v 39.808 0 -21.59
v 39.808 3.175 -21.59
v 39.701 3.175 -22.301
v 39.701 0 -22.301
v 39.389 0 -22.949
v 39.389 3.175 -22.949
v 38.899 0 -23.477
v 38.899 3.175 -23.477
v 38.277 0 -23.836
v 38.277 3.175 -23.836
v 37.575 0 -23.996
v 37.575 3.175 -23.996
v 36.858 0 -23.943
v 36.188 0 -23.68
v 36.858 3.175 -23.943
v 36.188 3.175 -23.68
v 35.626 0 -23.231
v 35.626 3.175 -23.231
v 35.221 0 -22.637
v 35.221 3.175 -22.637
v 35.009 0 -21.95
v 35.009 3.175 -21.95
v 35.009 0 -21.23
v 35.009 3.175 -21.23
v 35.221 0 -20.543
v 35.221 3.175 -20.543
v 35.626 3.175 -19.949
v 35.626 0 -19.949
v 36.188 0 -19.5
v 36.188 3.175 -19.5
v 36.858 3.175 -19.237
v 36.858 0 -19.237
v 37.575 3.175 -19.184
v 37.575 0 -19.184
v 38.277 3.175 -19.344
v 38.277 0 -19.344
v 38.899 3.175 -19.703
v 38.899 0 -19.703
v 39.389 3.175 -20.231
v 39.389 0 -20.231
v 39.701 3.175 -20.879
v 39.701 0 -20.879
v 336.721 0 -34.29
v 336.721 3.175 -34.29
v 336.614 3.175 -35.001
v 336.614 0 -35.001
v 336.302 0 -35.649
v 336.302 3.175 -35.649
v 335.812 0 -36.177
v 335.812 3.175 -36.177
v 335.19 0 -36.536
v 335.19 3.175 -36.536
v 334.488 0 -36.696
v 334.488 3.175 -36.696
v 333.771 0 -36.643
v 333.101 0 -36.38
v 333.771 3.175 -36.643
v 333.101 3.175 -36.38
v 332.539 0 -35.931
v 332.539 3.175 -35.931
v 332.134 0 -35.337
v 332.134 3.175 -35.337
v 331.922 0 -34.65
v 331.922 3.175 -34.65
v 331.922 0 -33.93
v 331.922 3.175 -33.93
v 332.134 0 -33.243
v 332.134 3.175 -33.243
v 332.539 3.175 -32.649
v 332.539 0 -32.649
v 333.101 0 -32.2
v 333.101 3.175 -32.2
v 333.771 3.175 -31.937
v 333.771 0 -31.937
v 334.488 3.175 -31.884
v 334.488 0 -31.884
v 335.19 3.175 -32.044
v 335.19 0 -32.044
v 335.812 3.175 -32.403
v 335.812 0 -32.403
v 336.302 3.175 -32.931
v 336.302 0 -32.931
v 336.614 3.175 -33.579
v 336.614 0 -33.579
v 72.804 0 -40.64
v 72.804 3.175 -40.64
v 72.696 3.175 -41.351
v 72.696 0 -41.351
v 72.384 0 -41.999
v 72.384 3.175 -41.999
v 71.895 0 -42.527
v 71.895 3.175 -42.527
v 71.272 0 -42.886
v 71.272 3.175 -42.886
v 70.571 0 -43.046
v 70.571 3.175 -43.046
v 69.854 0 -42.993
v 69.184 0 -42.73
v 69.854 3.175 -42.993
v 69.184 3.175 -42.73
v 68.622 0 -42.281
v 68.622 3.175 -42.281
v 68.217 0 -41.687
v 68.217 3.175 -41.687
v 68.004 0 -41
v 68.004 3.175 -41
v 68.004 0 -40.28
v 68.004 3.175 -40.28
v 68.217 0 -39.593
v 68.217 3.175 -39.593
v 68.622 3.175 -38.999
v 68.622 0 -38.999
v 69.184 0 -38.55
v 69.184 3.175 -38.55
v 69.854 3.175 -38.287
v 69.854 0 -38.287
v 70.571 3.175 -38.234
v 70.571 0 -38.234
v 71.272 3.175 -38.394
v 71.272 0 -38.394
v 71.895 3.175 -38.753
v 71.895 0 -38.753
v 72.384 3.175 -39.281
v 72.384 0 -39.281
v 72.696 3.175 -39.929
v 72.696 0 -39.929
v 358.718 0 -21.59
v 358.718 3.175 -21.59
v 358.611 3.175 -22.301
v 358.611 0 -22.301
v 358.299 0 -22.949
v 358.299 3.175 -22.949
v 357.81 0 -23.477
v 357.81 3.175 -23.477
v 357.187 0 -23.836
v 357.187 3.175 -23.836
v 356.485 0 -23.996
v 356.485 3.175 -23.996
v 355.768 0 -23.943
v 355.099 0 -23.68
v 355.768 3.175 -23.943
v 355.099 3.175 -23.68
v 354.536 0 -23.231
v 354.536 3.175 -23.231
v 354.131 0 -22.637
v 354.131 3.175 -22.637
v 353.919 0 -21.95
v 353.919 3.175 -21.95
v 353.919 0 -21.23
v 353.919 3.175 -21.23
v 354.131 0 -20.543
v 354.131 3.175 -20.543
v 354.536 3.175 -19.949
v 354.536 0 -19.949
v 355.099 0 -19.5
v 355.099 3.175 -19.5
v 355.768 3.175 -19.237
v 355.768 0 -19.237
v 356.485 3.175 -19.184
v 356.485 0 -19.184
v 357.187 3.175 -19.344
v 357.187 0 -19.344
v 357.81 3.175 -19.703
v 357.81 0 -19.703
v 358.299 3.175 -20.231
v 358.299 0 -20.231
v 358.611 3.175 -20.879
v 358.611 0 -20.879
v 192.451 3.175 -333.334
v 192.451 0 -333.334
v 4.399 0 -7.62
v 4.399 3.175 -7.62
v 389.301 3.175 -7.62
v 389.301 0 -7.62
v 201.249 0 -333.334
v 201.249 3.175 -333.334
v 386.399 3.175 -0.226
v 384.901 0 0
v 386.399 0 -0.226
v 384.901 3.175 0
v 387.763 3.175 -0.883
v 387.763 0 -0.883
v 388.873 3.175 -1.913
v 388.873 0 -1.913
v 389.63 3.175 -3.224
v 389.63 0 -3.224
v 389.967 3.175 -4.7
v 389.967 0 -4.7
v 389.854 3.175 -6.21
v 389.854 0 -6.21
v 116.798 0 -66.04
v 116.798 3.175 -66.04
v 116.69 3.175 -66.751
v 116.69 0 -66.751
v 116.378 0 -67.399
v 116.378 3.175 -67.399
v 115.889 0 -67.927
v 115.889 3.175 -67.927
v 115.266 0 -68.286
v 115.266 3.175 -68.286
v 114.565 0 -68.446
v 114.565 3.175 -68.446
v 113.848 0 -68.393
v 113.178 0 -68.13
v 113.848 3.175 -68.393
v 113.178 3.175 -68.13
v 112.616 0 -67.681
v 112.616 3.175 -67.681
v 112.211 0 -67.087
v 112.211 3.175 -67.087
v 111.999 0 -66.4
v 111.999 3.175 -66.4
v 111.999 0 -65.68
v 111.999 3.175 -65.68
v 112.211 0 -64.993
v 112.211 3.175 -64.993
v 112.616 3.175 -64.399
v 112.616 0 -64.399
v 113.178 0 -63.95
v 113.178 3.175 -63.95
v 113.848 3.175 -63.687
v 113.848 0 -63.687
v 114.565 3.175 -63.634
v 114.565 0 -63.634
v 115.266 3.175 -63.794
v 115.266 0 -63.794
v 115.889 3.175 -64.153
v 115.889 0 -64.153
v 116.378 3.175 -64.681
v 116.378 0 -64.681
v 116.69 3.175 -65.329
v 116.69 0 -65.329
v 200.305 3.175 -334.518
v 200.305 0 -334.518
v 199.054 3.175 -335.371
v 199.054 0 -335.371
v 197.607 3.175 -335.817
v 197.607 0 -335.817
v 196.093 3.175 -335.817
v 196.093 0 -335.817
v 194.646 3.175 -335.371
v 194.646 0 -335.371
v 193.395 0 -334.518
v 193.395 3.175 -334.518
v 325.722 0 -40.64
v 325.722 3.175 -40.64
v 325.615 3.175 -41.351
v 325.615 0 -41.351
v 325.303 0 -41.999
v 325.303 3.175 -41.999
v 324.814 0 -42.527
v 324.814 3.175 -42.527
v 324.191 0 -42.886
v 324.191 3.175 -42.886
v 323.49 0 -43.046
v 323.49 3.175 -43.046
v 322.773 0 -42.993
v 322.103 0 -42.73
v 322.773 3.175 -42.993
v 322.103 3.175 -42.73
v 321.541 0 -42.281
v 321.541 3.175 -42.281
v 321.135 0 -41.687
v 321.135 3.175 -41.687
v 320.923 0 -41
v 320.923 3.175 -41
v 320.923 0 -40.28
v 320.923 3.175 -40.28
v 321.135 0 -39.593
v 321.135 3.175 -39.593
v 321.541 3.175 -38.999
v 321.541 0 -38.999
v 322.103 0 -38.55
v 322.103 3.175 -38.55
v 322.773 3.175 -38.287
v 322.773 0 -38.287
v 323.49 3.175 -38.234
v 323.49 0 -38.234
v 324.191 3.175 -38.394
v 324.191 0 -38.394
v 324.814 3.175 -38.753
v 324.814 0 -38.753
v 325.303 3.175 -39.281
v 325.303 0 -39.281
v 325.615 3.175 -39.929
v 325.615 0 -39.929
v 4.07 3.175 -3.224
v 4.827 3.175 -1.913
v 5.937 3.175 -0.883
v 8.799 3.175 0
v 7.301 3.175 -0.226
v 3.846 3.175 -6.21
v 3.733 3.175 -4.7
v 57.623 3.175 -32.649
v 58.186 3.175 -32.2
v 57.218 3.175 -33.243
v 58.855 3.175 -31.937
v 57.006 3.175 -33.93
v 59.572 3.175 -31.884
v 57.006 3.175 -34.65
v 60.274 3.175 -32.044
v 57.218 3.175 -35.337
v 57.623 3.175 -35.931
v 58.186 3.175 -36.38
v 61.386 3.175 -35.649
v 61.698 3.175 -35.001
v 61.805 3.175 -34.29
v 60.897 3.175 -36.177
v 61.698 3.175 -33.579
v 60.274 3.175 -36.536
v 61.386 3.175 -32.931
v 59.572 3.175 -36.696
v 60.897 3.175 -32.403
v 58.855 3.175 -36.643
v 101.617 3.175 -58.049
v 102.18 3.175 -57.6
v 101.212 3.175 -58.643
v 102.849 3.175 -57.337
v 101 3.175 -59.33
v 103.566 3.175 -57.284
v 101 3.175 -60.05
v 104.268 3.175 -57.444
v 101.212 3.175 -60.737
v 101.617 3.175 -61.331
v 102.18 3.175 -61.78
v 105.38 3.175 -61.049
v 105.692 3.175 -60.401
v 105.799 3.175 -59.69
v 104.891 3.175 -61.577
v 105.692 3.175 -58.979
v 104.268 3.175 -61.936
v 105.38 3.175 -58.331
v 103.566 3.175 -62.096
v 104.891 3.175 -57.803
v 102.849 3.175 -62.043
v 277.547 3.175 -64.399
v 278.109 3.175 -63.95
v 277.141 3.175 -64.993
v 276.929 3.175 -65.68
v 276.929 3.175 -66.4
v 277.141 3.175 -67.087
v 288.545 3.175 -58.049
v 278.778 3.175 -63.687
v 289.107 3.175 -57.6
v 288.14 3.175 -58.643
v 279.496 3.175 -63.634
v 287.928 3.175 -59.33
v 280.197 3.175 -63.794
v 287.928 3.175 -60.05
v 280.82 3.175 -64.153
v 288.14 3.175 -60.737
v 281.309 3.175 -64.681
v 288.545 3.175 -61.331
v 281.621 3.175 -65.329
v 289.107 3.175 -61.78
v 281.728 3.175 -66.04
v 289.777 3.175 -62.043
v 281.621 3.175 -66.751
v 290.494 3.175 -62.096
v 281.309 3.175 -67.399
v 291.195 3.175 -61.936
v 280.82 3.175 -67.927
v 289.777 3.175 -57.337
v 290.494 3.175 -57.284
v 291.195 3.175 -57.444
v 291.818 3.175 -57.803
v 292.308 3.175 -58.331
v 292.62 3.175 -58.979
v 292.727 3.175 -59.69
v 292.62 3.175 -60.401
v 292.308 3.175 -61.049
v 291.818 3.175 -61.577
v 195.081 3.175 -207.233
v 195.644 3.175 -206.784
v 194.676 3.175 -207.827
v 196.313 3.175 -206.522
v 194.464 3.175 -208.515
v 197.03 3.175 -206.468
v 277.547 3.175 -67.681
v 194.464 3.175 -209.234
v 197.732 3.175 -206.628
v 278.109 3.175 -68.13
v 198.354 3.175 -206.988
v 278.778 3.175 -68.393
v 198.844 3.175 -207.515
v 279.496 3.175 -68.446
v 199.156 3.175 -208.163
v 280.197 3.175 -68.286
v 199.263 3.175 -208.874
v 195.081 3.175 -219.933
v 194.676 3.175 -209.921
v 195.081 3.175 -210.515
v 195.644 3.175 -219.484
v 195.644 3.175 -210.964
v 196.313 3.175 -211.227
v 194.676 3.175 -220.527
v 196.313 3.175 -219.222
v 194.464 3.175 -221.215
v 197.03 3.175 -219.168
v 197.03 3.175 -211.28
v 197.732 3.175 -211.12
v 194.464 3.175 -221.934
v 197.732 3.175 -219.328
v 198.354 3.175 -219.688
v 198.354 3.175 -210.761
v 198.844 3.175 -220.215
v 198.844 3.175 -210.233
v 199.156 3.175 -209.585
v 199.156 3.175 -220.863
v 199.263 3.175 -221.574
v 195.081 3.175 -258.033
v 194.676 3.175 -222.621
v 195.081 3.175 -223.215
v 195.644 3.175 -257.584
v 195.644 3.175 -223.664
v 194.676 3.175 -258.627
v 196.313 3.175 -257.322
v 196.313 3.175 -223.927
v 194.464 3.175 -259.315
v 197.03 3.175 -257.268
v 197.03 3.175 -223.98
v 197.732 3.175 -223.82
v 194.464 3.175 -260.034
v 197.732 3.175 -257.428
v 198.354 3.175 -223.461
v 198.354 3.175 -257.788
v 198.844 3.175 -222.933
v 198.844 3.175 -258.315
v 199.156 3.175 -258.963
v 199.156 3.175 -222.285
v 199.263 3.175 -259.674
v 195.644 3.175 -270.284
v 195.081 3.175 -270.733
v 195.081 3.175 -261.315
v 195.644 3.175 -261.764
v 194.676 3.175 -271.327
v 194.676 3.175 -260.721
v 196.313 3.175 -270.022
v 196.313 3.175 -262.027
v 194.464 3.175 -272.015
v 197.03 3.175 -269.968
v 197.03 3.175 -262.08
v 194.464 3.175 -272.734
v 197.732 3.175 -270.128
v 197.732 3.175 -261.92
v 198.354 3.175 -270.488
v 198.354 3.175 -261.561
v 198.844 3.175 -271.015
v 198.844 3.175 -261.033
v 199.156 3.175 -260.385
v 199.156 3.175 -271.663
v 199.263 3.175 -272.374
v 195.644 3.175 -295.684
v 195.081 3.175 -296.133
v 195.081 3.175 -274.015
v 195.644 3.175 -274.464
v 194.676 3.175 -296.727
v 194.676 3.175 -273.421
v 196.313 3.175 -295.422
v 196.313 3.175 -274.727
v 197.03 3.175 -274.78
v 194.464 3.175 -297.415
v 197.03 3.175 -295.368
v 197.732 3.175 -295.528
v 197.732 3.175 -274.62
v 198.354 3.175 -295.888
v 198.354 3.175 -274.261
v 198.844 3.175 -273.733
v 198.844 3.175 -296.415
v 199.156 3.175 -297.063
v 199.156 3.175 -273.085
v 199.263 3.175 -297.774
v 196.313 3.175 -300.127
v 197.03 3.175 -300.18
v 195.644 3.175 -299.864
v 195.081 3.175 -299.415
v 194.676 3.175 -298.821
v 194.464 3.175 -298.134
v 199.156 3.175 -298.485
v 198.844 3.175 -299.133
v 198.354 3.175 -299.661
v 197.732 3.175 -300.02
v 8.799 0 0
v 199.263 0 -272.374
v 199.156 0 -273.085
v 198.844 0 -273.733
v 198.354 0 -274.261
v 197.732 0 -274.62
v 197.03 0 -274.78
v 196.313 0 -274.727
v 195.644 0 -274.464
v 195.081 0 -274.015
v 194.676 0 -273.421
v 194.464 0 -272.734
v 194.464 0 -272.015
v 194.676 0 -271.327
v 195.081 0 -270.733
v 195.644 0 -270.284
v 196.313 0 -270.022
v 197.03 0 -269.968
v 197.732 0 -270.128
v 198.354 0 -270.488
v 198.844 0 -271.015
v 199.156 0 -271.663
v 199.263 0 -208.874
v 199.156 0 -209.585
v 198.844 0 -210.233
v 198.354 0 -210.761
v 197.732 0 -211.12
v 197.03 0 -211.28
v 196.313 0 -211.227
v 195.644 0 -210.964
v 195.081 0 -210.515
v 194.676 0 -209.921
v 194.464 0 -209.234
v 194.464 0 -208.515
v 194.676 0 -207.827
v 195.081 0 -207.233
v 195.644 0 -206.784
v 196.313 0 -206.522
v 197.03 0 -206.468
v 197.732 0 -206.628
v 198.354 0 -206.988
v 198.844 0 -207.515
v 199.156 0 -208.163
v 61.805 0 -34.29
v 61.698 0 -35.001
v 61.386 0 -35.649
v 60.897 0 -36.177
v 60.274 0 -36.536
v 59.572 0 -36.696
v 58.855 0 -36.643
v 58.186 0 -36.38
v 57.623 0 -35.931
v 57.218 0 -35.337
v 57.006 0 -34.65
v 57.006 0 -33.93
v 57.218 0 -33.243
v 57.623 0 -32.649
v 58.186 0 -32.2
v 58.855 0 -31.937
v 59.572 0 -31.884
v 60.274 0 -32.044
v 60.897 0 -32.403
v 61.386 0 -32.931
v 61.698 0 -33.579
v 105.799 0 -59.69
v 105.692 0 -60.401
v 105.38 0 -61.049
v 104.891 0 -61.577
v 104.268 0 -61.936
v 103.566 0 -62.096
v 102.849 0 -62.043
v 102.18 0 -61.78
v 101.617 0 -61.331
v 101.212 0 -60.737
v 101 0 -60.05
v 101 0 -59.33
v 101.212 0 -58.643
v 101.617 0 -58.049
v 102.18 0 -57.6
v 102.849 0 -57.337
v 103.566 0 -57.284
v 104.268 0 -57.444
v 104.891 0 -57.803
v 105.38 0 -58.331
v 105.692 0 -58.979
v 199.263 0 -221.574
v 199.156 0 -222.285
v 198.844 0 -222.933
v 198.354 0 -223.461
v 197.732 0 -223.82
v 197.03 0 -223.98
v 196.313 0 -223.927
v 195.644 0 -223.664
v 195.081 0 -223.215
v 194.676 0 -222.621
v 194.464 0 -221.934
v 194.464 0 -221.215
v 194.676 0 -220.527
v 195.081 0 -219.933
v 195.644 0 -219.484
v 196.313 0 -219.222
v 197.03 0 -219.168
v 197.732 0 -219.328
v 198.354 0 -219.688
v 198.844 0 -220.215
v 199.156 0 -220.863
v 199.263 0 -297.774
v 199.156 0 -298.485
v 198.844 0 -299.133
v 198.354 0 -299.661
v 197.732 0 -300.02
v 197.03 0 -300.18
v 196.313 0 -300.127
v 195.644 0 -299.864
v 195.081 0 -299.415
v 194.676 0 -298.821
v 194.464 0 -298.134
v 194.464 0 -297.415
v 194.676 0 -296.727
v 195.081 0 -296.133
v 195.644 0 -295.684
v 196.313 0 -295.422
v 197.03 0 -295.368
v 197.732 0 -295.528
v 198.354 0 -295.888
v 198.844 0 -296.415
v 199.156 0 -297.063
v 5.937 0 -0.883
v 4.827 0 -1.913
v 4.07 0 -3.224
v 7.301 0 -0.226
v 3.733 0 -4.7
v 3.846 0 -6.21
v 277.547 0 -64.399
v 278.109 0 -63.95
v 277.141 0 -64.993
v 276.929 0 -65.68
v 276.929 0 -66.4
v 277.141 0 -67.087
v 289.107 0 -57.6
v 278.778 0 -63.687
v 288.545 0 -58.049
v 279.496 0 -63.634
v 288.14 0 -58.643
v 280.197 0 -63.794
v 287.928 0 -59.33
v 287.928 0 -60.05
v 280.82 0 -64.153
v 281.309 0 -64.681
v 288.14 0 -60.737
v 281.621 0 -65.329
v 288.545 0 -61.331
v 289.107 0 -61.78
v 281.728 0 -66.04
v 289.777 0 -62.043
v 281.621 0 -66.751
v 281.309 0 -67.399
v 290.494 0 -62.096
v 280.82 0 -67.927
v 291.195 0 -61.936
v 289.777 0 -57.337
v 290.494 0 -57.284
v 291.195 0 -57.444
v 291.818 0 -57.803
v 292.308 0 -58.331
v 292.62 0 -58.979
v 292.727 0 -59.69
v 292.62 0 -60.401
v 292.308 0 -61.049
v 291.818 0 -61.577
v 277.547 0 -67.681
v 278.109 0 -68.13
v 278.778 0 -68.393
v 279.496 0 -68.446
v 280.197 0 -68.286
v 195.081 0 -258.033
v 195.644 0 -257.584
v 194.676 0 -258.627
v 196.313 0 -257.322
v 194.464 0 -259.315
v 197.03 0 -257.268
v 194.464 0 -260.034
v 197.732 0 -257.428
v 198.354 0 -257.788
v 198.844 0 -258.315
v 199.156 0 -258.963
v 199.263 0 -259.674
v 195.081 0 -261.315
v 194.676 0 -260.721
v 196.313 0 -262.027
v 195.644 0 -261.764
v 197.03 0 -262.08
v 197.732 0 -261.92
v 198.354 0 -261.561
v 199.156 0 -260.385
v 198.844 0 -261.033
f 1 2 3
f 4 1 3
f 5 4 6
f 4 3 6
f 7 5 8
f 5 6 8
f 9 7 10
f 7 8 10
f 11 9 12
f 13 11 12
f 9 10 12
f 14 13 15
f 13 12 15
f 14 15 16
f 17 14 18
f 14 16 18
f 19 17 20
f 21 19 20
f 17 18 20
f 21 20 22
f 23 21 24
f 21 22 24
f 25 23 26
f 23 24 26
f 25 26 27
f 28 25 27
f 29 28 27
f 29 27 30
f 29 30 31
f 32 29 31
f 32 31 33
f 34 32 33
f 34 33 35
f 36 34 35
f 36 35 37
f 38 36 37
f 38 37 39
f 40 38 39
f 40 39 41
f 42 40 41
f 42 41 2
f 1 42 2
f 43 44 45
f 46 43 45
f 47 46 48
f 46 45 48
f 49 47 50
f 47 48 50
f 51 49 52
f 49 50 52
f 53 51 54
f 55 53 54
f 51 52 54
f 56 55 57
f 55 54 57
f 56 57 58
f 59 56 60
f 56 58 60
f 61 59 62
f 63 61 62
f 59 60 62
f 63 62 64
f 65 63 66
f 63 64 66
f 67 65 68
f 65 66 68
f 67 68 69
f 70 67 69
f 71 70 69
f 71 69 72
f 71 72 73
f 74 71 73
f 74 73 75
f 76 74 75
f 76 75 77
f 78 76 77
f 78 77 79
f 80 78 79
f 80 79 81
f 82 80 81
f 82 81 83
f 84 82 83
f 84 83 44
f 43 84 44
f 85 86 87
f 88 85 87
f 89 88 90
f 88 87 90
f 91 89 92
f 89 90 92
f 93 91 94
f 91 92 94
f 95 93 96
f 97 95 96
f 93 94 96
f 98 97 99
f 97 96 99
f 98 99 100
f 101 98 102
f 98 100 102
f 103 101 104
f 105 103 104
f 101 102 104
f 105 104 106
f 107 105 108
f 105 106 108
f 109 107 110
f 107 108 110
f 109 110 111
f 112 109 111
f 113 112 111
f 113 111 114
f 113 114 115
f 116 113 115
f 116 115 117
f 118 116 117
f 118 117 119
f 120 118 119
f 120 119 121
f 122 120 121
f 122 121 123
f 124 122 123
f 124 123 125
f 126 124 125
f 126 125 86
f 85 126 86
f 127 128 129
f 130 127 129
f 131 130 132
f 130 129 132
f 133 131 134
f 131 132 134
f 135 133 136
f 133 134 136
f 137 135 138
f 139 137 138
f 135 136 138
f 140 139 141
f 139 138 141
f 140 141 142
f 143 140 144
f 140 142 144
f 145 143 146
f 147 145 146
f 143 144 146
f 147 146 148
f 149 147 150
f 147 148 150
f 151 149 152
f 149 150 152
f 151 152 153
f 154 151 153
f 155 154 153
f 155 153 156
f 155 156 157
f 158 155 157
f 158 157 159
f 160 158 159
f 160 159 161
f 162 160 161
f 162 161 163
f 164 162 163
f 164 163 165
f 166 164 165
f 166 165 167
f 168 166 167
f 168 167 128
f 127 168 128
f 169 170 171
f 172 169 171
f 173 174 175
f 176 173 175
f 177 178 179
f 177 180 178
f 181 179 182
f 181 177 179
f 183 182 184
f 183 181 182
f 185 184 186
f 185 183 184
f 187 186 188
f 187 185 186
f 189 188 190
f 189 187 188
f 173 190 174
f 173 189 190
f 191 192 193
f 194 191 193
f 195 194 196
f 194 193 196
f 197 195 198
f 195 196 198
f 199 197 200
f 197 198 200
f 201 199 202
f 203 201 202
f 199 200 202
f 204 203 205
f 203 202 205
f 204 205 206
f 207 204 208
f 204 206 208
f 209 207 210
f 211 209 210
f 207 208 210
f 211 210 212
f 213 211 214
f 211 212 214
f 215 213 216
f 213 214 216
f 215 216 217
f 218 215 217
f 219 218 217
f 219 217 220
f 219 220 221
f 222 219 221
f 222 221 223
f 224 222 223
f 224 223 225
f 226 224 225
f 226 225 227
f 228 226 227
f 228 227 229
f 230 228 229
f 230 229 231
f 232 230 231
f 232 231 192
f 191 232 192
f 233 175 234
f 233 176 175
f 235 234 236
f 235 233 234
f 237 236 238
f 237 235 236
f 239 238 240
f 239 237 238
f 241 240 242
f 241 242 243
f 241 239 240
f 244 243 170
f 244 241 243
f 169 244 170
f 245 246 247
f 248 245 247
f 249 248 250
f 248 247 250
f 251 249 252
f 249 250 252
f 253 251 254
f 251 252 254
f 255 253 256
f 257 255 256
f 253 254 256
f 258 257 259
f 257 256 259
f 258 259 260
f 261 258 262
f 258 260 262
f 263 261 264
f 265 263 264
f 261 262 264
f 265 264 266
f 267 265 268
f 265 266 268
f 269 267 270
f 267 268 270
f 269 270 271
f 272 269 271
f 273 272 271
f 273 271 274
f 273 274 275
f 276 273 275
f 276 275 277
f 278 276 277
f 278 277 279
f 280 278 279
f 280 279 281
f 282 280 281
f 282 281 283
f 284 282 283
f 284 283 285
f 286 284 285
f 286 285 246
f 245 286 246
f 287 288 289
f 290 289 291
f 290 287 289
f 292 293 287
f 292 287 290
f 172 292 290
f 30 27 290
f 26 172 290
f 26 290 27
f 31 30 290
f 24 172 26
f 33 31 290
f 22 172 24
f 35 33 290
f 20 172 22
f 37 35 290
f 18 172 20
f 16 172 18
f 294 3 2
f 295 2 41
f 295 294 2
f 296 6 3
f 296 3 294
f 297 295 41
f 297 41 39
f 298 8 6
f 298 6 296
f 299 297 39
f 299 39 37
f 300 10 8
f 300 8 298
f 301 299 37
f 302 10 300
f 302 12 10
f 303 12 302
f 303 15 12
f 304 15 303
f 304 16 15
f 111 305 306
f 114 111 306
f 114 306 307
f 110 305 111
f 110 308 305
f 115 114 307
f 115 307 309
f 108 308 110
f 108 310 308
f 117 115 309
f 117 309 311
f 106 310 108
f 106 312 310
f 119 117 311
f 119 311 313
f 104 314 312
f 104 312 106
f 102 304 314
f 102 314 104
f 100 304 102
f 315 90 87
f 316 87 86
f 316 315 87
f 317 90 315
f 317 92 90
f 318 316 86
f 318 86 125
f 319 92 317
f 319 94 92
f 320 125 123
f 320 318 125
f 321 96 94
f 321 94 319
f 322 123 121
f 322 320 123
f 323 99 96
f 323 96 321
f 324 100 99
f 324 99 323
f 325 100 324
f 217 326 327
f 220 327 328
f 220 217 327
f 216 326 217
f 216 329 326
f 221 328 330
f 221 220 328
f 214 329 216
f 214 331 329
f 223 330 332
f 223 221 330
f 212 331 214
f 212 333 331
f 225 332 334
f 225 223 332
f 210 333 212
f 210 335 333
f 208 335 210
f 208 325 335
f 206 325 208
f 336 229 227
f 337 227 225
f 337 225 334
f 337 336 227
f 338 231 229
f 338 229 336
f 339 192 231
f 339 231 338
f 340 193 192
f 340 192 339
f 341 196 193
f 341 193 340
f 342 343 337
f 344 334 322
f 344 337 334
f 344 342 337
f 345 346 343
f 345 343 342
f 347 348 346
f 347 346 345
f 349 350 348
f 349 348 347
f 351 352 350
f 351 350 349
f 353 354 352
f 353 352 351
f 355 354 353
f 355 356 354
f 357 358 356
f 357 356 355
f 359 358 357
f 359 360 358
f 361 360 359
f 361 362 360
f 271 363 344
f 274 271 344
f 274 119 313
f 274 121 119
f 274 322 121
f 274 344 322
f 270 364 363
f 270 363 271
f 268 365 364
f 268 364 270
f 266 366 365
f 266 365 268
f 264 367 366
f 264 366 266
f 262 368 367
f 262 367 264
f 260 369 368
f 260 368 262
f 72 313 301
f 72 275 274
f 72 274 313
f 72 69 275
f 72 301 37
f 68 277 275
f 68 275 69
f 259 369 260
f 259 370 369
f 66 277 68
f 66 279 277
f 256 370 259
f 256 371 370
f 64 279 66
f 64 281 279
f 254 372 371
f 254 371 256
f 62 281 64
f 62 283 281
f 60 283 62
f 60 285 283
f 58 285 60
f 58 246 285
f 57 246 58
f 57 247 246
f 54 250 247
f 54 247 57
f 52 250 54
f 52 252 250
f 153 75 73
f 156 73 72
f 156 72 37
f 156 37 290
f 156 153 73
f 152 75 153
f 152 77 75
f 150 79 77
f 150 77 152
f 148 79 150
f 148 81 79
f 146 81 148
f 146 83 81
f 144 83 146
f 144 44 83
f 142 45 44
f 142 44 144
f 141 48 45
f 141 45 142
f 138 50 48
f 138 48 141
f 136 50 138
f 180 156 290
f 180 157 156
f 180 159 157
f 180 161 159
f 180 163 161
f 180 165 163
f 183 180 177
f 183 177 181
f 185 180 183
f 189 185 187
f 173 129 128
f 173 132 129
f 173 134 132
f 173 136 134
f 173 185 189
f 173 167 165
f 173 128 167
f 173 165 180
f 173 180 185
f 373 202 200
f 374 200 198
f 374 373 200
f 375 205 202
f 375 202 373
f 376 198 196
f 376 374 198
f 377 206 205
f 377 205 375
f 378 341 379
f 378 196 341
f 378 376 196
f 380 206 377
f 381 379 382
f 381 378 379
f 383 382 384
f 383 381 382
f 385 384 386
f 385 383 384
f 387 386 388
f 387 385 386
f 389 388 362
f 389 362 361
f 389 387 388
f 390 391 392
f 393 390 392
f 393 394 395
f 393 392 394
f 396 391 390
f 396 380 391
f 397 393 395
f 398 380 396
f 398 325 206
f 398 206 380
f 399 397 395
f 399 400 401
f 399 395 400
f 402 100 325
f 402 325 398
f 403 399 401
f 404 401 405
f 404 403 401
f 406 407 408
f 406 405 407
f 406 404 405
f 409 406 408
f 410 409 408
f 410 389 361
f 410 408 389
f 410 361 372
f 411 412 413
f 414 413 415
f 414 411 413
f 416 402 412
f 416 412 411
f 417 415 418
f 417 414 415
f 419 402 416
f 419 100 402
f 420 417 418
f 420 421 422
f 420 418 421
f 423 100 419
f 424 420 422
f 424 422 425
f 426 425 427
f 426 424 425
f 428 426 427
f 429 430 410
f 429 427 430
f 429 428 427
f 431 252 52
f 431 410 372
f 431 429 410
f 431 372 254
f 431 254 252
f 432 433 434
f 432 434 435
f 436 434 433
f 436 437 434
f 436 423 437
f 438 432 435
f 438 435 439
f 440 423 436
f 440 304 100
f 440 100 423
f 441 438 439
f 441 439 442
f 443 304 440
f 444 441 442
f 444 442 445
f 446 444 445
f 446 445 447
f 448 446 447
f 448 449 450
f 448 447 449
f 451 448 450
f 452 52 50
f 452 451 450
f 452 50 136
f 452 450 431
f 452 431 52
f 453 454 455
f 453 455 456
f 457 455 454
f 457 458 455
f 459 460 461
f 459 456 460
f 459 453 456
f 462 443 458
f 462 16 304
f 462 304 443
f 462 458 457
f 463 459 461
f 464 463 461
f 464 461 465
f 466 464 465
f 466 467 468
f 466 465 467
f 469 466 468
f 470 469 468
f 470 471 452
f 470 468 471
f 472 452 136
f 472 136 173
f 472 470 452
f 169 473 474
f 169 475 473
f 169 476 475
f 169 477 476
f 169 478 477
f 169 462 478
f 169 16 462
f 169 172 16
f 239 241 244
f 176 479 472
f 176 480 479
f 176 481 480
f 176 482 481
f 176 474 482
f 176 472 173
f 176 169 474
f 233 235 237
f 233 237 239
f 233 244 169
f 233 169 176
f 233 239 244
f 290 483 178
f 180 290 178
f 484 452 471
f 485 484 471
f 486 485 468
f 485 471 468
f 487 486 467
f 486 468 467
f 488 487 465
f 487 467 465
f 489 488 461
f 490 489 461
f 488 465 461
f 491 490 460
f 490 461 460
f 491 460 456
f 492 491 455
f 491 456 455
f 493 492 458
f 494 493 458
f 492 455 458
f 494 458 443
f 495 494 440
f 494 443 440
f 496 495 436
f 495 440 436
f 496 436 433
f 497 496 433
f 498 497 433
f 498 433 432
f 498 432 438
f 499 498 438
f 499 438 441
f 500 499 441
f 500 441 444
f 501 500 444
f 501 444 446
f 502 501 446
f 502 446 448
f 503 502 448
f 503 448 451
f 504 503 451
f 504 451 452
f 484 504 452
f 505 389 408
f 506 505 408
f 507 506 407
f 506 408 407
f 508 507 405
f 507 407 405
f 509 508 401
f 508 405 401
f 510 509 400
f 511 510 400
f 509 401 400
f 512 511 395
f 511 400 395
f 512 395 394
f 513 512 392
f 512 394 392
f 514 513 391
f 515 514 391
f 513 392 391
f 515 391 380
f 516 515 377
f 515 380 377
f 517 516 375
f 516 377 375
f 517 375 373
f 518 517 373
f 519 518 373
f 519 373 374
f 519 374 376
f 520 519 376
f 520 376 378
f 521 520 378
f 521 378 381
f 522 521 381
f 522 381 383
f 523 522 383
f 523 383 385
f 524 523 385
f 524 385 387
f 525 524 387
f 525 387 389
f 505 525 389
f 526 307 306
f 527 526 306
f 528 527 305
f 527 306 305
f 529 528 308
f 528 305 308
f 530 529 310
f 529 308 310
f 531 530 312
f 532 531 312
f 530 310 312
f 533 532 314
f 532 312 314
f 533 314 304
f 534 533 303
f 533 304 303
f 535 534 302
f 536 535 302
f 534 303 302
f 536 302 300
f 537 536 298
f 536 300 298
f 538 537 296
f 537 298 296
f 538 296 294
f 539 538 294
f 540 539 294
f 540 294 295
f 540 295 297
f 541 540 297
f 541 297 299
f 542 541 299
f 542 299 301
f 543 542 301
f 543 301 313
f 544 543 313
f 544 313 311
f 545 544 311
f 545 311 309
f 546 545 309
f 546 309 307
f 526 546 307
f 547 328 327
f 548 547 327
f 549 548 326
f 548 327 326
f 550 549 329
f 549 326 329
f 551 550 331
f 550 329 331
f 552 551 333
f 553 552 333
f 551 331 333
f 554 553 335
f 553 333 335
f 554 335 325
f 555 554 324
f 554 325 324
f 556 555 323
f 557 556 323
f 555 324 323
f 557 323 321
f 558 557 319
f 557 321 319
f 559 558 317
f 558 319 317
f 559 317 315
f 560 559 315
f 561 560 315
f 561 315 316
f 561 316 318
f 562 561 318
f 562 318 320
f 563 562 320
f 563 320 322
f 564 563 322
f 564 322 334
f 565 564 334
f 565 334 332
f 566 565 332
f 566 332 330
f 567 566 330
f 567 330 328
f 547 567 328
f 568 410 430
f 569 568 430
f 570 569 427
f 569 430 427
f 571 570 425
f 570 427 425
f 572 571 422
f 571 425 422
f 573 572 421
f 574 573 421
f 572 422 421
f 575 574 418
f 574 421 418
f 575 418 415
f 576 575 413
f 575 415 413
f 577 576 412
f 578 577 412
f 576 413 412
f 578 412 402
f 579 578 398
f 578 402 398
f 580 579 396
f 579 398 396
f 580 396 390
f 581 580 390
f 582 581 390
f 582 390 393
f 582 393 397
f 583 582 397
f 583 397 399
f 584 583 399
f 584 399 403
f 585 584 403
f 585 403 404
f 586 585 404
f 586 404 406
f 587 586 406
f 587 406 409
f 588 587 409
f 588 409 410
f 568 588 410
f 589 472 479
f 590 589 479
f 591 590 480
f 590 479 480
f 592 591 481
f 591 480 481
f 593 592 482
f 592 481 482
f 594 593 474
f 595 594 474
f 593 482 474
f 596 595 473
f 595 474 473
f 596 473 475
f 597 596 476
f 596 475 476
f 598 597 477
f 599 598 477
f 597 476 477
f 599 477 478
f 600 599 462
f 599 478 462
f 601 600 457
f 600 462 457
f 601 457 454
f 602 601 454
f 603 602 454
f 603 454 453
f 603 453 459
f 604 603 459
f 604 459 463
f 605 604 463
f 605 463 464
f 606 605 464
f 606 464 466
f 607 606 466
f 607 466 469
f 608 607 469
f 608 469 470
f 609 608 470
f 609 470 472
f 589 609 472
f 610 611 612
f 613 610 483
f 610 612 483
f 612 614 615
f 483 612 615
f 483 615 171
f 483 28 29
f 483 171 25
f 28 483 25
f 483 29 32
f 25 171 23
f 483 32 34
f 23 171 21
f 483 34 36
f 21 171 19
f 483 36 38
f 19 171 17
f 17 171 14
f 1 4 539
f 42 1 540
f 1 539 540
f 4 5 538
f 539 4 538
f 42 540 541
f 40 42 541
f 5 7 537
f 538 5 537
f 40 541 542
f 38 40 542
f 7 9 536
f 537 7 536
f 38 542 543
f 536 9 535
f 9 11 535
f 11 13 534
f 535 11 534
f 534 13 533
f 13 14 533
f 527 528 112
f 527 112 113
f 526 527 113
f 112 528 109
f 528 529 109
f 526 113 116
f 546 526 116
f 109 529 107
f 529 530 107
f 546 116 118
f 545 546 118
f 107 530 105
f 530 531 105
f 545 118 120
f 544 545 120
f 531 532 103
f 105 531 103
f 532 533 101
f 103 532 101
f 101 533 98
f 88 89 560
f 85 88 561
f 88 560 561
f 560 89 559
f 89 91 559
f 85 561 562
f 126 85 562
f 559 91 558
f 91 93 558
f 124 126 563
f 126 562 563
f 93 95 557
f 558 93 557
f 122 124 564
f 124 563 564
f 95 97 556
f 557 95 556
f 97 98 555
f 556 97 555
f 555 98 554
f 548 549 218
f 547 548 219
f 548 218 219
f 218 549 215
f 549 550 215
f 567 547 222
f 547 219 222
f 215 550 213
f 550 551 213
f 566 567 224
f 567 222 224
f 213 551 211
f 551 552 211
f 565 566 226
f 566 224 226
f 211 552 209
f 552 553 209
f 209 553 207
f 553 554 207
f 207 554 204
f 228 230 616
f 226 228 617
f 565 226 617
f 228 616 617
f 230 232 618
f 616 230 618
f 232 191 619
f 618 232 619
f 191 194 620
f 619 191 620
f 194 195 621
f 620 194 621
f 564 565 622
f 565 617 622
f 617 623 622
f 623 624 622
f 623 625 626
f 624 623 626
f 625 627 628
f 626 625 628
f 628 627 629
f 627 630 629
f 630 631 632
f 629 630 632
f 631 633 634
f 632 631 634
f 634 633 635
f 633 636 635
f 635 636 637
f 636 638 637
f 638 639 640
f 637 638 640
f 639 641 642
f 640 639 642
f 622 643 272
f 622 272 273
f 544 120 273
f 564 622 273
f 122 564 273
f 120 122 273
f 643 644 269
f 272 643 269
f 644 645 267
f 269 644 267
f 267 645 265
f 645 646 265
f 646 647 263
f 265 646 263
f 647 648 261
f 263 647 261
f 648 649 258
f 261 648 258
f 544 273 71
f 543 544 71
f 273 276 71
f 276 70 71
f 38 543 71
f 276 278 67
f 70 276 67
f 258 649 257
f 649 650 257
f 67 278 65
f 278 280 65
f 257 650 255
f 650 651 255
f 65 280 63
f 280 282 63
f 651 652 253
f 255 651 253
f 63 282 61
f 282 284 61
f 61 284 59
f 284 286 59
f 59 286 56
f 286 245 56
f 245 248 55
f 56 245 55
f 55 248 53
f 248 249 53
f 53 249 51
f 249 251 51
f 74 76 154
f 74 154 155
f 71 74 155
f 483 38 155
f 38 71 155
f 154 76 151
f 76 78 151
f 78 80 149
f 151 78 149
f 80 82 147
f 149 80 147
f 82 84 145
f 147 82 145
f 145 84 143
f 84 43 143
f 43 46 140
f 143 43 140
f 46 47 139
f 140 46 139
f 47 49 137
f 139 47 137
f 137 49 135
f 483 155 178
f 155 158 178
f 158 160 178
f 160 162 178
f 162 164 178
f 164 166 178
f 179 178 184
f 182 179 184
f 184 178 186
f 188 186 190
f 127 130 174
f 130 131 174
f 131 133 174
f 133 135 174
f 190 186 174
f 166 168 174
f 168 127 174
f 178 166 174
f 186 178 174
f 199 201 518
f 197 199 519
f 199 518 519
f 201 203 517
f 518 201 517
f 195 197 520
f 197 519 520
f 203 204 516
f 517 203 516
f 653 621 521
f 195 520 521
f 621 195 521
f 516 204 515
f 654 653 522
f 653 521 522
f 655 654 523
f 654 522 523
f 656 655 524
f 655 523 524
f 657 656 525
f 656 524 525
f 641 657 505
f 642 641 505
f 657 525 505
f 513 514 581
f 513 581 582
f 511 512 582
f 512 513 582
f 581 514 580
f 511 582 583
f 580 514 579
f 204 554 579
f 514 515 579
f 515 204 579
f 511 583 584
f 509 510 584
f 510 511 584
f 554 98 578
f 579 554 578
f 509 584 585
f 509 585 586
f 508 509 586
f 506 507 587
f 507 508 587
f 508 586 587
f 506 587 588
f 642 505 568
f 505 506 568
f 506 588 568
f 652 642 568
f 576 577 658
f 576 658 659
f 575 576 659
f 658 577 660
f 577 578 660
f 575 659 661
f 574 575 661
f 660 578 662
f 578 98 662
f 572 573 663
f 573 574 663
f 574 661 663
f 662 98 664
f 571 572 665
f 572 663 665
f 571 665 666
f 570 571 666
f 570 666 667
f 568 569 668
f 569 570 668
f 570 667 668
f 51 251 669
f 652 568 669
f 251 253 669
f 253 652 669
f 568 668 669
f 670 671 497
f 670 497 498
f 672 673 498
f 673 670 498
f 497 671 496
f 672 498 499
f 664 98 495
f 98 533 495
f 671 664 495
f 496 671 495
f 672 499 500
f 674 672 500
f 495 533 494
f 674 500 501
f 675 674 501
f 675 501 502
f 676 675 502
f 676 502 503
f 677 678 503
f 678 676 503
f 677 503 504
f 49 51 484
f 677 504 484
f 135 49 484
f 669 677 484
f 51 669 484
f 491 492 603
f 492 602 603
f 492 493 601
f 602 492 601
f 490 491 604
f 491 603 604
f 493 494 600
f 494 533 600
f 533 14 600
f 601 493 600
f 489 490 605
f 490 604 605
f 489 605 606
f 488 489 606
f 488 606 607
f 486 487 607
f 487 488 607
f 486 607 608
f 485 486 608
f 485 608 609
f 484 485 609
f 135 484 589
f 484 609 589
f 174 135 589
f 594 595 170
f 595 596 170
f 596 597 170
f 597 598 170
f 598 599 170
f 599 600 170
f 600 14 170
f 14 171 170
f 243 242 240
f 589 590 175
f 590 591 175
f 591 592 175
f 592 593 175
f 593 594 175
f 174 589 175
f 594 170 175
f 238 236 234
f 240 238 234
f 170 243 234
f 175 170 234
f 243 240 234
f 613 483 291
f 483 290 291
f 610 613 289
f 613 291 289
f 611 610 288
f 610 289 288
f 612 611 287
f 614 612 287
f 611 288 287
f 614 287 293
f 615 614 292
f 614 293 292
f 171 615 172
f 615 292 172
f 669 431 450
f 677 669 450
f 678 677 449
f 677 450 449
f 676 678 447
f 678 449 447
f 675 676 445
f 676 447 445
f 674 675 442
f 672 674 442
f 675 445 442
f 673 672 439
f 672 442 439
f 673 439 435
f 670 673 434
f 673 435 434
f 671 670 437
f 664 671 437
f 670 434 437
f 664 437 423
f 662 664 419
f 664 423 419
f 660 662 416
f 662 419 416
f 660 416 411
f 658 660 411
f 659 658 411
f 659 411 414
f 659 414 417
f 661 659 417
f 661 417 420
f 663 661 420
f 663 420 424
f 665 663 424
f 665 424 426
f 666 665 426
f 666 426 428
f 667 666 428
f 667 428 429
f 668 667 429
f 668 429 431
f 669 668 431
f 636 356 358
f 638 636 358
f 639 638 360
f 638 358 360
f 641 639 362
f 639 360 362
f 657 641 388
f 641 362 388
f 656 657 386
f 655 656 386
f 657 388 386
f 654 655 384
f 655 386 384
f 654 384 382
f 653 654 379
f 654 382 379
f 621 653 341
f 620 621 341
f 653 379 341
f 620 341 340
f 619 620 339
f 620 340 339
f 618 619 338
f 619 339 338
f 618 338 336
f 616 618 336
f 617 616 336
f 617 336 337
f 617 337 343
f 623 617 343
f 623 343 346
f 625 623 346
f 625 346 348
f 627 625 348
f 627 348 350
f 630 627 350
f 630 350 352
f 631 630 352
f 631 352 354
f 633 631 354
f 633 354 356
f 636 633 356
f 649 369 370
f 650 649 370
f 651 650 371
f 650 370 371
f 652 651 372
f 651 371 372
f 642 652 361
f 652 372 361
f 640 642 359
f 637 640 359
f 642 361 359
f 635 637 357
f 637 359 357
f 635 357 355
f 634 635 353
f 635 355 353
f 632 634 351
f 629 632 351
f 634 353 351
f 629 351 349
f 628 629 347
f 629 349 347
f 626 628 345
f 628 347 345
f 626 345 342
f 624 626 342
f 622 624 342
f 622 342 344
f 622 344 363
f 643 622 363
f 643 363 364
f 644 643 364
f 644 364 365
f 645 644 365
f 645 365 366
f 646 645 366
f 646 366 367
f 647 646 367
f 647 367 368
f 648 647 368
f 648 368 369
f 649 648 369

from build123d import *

# Parameters (mm, degrees)
BOSS_EXTRUDE1_DEPTH = 3.175
FILLET1_R           = 5.08
SKETCH2_R           = 2.413
CUT_EXTRUDE1_DEPTH  = 14.153467


with BuildPart() as part:
    # Sketch1 → Boss-Extrude1 (new body)
    with BuildSketch(Plane(origin=(0, 0, 0), x_dir=(1, 0, 0), z_dir=(0, 1, 0))):
        Polygon((0, 0), (393.7, 0), (196.85, 340.95420147), align=None)
    extrude(amount=BOSS_EXTRUDE1_DEPTH)

    # Fillet1
    fillet1_edges = [part.edges().sort_by_distance(p)[0] for p in [
        (196.85, 1.5875, -340.95420147),
        (393.7, 1.5875, 0),
        (0, 1.5875, 0),
    ]]
    fillet(fillet1_edges, radius=FILLET1_R)

    # Sketch2 → Cut-Extrude1 (cut)
    with BuildSketch(Plane(origin=(0, 3.175, 0), x_dir=(1, 0, 0), z_dir=(0, 1, 0))):
        with Locations((37.394976935, 21.59)):
            Circle(SKETCH2_R)
        with Locations((59.392022192, 34.29)):
            Circle(SKETCH2_R)
        with Locations((70.39054482, 40.64)):
            Circle(SKETCH2_R)
        with Locations((114.384635332, 66.04)):
            Circle(SKETCH2_R)
        with Locations((103.386112704, 59.69)):
            Circle(SKETCH2_R)
        with Locations((196.85, 297.77420147)):
            Circle(SKETCH2_R)
        with Locations((196.85, 272.37420147)):
            Circle(SKETCH2_R)
        with Locations((196.85, 259.67420147)):
            Circle(SKETCH2_R)
        with Locations((196.85, 221.57420147)):
            Circle(SKETCH2_R)
        with Locations((196.85, 208.87420147)):
            Circle(SKETCH2_R)
        with Locations((279.315364668, 66.04)):
            Circle(SKETCH2_R)
        with Locations((290.313887296, 59.69)):
            Circle(SKETCH2_R)
        with Locations((323.30945518, 40.64)):
            Circle(SKETCH2_R)
        with Locations((334.307977808, 34.29)):
            Circle(SKETCH2_R)
        with Locations((356.305023065, 21.59)):
            Circle(SKETCH2_R)
    extrude(amount=-CUT_EXTRUDE1_DEPTH, mode=Mode.SUBTRACT)


solid = part.part
